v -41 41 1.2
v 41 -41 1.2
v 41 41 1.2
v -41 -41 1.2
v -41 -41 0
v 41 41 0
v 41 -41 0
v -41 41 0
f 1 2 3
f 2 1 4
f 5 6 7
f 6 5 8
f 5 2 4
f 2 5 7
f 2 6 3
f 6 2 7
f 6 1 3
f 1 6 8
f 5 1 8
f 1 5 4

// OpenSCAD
// Seed OpenSCAD file for task 10; complete it from 01_kicad_mechanical_map.csv.
$fn = 32;
board = [82.000, 82.000, 1.200];
wall = 2.700;
module placeholder_board() {
  translate([-board[0]/2, -board[1]/2, 0]) cube(board);
}
placeholder_board();
